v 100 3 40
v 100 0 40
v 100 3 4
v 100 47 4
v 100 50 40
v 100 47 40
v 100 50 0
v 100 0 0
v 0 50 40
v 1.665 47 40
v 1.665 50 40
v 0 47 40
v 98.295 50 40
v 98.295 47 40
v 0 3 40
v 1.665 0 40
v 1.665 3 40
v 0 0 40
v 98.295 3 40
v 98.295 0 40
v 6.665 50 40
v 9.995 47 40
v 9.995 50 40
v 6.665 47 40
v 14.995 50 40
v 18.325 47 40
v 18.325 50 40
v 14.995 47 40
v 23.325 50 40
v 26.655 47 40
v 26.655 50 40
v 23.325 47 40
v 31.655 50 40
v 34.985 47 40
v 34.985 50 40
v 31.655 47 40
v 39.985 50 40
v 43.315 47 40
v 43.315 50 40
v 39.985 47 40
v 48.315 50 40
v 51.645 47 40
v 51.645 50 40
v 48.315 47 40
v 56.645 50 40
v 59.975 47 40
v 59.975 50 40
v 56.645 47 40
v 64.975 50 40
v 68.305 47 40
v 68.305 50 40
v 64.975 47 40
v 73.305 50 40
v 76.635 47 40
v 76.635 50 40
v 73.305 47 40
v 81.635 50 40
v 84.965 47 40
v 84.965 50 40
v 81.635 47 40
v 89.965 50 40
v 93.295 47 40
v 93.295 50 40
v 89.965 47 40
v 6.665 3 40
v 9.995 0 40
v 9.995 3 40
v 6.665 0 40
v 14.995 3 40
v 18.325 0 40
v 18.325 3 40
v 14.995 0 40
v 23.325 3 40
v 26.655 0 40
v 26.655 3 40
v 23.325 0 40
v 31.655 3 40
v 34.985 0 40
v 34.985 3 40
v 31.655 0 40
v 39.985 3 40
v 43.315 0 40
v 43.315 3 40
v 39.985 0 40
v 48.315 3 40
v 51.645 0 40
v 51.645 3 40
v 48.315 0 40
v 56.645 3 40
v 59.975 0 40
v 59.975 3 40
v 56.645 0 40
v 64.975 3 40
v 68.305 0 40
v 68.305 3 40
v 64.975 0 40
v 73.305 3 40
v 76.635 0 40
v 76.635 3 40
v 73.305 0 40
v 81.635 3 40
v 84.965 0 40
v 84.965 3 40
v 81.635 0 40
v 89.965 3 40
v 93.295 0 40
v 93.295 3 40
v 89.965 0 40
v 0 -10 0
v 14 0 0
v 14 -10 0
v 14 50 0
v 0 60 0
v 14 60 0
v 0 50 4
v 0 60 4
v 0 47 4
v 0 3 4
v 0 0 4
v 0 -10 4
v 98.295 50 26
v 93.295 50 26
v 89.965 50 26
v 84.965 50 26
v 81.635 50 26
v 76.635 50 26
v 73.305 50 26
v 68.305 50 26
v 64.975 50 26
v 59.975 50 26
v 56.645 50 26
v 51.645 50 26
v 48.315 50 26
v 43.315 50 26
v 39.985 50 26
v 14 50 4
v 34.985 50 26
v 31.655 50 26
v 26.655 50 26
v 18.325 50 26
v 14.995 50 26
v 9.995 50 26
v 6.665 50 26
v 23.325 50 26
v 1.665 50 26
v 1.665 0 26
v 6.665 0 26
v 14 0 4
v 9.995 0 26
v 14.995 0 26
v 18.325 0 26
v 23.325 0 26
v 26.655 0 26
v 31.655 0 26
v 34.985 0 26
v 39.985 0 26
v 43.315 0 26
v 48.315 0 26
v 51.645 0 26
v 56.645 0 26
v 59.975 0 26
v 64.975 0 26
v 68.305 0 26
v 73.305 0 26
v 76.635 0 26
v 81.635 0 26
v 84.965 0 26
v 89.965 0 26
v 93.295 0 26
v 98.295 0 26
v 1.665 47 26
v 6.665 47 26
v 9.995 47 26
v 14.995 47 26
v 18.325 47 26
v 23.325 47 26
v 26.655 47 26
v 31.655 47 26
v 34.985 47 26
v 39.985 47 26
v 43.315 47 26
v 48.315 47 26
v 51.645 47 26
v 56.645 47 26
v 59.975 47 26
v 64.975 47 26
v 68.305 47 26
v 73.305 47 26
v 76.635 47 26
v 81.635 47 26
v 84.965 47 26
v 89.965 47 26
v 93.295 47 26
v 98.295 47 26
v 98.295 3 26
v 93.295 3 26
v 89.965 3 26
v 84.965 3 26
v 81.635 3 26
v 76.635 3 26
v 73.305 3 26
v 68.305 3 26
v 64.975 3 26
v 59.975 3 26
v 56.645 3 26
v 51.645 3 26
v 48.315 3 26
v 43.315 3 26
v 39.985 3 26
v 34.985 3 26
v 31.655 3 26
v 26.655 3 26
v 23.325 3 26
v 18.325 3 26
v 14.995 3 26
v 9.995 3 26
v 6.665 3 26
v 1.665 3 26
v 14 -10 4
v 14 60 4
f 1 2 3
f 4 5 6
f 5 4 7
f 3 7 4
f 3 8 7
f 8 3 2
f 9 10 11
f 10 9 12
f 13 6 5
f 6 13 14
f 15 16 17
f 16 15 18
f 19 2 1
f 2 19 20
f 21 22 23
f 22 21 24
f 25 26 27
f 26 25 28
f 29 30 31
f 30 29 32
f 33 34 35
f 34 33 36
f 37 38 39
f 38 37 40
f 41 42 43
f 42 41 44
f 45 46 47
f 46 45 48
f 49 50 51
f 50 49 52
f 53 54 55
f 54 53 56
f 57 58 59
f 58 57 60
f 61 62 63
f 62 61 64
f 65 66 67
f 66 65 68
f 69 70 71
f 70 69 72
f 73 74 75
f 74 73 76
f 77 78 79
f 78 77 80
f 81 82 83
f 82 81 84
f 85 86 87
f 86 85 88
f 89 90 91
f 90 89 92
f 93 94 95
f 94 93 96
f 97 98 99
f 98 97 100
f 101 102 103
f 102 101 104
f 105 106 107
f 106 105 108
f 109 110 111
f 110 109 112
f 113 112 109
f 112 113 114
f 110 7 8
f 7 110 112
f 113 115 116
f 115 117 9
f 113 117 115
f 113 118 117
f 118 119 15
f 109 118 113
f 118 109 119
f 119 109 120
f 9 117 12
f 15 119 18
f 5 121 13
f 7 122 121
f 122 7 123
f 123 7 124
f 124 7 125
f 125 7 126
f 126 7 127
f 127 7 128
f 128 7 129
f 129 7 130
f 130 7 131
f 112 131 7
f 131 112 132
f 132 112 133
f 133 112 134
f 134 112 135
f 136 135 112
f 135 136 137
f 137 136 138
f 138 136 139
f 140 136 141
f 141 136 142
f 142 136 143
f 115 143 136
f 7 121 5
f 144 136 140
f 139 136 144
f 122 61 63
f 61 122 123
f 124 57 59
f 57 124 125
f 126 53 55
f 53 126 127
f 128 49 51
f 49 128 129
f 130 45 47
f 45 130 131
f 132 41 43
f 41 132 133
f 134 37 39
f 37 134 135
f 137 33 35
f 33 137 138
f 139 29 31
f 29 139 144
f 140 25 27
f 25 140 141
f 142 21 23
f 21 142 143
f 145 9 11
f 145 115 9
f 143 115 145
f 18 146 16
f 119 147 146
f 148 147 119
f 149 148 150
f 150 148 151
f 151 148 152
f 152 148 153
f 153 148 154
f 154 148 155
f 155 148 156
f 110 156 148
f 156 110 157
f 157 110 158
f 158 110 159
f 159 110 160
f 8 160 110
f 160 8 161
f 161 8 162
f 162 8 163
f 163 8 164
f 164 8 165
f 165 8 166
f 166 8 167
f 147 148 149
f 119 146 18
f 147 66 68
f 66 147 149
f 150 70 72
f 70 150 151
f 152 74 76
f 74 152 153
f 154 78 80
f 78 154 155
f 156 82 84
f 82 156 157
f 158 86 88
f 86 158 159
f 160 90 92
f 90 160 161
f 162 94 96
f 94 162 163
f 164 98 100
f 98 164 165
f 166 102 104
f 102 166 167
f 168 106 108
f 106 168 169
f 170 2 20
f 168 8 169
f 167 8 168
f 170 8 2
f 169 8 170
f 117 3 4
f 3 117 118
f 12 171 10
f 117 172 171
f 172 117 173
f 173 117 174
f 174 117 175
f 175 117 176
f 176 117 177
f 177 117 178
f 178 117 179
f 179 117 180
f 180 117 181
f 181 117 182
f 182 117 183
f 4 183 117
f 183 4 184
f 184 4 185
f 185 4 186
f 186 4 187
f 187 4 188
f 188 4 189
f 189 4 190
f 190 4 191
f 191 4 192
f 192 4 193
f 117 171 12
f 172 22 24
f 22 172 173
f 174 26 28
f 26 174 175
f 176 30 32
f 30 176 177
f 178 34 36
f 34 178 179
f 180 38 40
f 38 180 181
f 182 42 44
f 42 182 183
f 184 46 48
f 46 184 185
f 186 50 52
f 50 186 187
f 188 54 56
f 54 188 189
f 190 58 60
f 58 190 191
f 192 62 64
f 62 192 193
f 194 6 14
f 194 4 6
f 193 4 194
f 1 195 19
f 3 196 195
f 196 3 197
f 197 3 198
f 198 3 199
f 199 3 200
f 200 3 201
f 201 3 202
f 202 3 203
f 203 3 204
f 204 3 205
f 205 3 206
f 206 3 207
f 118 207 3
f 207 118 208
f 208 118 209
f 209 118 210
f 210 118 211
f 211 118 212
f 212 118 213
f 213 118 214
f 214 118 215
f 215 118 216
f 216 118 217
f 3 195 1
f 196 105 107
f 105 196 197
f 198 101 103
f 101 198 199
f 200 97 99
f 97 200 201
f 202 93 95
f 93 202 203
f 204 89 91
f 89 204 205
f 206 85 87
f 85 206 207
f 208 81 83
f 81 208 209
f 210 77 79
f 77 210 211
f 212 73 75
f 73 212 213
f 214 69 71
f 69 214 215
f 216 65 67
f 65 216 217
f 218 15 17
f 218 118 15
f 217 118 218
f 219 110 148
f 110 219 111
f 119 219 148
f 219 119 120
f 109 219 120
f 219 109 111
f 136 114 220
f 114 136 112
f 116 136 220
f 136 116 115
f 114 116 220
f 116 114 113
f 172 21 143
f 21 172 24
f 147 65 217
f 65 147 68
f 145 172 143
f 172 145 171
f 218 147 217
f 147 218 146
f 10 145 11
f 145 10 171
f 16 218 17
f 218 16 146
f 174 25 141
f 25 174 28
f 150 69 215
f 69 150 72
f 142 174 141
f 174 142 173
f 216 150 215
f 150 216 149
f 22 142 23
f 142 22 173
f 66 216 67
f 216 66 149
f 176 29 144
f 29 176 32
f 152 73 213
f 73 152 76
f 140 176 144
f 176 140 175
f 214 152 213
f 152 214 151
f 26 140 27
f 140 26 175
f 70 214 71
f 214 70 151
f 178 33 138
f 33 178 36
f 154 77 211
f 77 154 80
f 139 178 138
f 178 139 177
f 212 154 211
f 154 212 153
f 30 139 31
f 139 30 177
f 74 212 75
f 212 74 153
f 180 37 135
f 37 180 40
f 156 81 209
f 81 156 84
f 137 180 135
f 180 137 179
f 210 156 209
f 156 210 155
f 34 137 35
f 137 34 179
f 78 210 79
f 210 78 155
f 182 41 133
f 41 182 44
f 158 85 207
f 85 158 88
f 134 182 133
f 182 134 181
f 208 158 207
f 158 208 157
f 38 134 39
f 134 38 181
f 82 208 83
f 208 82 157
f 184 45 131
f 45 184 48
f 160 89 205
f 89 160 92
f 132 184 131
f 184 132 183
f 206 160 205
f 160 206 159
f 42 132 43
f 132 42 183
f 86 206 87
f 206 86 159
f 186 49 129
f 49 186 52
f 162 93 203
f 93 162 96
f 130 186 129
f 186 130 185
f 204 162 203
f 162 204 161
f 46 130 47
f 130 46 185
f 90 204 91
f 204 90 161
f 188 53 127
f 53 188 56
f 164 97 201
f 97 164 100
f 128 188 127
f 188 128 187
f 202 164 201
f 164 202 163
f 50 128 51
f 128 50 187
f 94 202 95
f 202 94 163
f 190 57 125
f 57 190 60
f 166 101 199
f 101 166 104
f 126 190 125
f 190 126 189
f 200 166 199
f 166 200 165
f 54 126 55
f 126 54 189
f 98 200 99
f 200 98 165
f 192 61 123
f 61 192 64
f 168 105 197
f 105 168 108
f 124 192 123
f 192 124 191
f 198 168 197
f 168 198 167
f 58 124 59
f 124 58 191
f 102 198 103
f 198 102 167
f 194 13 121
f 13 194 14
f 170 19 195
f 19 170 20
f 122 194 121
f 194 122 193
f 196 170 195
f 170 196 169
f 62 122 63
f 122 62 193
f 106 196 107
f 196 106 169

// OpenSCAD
$fn = 32;

// ----------------------------------------------------------------------
// Cable duct: 100 x 50 x 40 mm, 12 fingers
// ----------------------------------------------------------------------

// --- parameters (mm) ---
channel_l = 100;          // duct length, X
channel_w = 50;           // duct width, Y
channel_h = 40;           // duct height, Z
channel_t = 3;            // side wall thickness
floor_t = 4;              // floor thickness
slot_w = 5;               // finger slot width
slot_h = 22;              // finger slot height
fingers = 12;             // number of finger slots per side
pitch = 8.33;             // finger pitch
ear_w = 11;               // mounting ear width
ear_l = 14;               // mounting ear length

module shell() {
  difference() {
    cube([channel_l, channel_w, channel_h]);
    /* open top channel */
    translate([-channel_t - 1, channel_t, floor_t])
      cube([channel_l + 2 * channel_t + 2, channel_w - 2 * channel_t, channel_h + 1]);
  }
}

module ears() {
  translate([0, -ear_w + 1, 0]) cube([ear_l, ear_w, floor_t]);
  translate([0, channel_w - 1, 0]) cube([ear_l, ear_w, floor_t]);
}

difference() {
  union() {
    shell();
    ears();
  }
  /* finger slots cut through both side walls */
  for (i = [0 : fingers - 1]) translate([pitch / 2 + i * pitch - slot_w / 2, -1, floor_t + slot_h]) cube([slot_w, channel_w + 2, channel_h]);
}
